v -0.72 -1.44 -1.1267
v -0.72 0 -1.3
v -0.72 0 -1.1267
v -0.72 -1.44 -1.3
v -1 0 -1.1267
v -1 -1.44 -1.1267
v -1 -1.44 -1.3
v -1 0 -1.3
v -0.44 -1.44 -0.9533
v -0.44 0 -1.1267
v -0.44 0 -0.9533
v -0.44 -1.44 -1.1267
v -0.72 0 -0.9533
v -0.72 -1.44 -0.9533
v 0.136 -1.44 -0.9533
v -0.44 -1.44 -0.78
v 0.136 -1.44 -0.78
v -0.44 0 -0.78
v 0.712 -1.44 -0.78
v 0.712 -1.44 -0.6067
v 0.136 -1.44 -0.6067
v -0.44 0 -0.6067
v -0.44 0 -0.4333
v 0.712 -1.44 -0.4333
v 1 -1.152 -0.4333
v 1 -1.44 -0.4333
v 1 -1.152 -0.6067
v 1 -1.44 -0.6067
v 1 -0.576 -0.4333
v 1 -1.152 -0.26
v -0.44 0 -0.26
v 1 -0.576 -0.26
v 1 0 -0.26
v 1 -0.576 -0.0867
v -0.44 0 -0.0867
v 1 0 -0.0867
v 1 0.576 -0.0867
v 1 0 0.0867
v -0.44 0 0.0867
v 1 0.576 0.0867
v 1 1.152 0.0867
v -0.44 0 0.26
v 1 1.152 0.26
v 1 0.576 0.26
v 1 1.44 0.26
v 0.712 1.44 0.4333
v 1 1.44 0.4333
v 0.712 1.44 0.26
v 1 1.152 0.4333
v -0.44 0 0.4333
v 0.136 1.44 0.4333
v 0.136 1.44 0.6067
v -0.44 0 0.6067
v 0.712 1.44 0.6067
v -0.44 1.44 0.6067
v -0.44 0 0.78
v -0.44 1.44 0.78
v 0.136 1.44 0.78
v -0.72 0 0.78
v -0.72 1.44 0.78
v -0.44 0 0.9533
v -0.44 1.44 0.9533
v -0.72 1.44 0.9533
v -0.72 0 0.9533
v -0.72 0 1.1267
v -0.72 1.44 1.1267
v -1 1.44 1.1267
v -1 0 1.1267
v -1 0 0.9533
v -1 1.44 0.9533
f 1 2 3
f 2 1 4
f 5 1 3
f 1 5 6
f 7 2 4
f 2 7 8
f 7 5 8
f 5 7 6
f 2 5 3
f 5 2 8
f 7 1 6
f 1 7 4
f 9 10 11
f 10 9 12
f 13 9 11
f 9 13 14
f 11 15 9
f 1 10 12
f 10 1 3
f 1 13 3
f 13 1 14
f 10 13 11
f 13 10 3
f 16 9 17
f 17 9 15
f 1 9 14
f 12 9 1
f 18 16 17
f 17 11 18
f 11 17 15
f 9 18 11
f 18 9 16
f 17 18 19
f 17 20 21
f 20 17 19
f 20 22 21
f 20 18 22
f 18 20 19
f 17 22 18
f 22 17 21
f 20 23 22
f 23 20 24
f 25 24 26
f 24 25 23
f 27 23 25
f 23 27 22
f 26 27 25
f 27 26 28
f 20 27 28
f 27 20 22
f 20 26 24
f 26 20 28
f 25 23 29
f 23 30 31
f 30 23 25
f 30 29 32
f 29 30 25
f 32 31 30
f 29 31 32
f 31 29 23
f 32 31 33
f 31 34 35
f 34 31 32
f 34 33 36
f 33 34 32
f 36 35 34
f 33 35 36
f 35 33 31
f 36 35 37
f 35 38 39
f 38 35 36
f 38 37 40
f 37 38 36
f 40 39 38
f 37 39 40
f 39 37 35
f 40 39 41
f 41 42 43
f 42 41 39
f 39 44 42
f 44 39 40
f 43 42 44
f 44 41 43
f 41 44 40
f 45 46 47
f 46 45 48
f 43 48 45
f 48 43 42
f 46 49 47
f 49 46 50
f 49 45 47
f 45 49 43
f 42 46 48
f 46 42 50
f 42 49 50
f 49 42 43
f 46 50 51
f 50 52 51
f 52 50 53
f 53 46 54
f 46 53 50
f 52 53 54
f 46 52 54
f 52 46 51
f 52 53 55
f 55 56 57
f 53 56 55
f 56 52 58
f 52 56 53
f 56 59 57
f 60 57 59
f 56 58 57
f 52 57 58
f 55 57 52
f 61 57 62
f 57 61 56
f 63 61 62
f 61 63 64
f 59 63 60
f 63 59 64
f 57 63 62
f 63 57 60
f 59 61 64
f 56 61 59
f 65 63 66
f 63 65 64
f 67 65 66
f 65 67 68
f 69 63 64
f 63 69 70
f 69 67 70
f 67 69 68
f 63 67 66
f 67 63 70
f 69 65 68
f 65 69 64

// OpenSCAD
disponible_x=2.0;
disponible_y=2.88;
disponible_z=2.6;

//de lo sig alternar valores  
//(14 , 1 , 0.9 )
//(13 , 2  , 1.05 )
//(14 , 3 , 1.15)
//(13  , 4 , 1.30)
//(14,  5 , 1.44 ) /

no_escalones=14; //total de niveles en alto
descansos_divs=5; //divisiones en los descansos
ancho_escalones=1.44; //ancho del pasillo del escalon

translate([ - disponible_x/2, - disponible_y/2, - disponible_z/2]){




//ya no variable
espaciox_pescalns=(disponible_x-ancho_escalones)*2;
espacioy_pescalns=disponible_y-(ancho_escalones *2);
total_escalones_ordinarios=no_escalones - (2 * descansos_divs);
huella_pred=(espaciox_pescalns+espacioy_pescalns)/total_escalones_ordinarios;
//echo("preeliminar_huella:",huella_pred);

//cuantos entran en el eje x
cuantos_x=round(espaciox_pescalns/huella_pred);
cuantos_y=round(espacioy_pescalns/huella_pred);
echo("seran en x,y resp. ",cuantos_x,cuantos_y);

tr_x=(espaciox_pescalns/2) / round(cuantos_x/2);
tr_y=espacioy_pescalns / cuantos_y;
tr_z=(disponible_z/(no_escalones+1));
echo("alto de escalon: ",tr_z);
echo("huella en x:",tr_x);
echo("huella en y:",tr_y);
for (i=[0:(round( cuantos_x / 2))-1]){
    tr_x_r=i*tr_x;
    tr_z_r=i*tr_z;
    translate([tr_x_r,0,tr_z_r]){
        
        cube([tr_x,ancho_escalones,tr_z]);  
    }
    
}

glob_tr_x=(round( cuantos_x / 2)) * (espaciox_pescalns/2) / round(cuantos_x/2);
glob_tr_z=(round( cuantos_x / 2)) * (disponible_z/(no_escalones+1));
glob_tr_y=ancho_escalones;

//el o los descansos
if(descansos_divs==1){
    //un cuadrado
    translate([glob_tr_x,0,glob_tr_z]){
        cube([ancho_escalones,ancho_escalones,tr_z]);
    }
    
}else{  
    //REPLICAR ESTO EN EL SIGUIENTE DESCANSO
    huella_ext=(ancho_escalones*2)/descansos_divs;
    for(i=[1:descansos_divs]){
        sig_h=i*huella_ext;
        translate_z=glob_tr_z+(tr_z*(i-1));
        if(sig_h<= ancho_escalones){
            //se sigue en el eje que se venia usando (x)
            nuePosX=(glob_tr_x+(huella_ext*(i-1)));
            translate([0,0,translate_z]){
            linear_extrude(height=tr_z){
                polygon(points=[ [nuePosX,0],[(nuePosX+huella_ext),0],[glob_tr_x,ancho_escalones ] ]);
            }}
        }else{
            //verificar si ya que da en el otro eje totalmente o no
            if( (huella_ext*(i-1)) < ancho_escalones && sig_h> ancho_escalones ){
                nuePosX=(glob_tr_x+(huella_ext*(i-1)));
                nuePosY=  ( huella_ext - ( (glob_tr_x+ancho_escalones) - nuePosX ) ) ; 
                translate([0,0,translate_z]){
                 linear_extrude(height=tr_z){
                        polygon(points=[ [nuePosX,0] ,[(glob_tr_x+ancho_escalones),0], [(glob_tr_x+ancho_escalones), nuePosY ],[glob_tr_x,ancho_escalones ] ]);
                     }}
               
            }else{
                //ya es totalmente del siguiente eje
                nuePosY=  (huella_ext*(i-1)) - ancho_escalones ;
                //echo("...",nuePosY);
                translate([0,0,translate_z]){
            linear_extrude(height=tr_z){
                polygon(points=[ [disponible_x,nuePosY],[disponible_x, (nuePosY + huella_ext)],[glob_tr_x,ancho_escalones ] ]);
            }}
            }
            
        }
    }
}
//x se queda en el mismo lugr
//asignaremos y porque ahora vamos en direccion de y+
if(cuantos_y>0){
for (i=[0: cuantos_y -1]){
    tr_y_r=(i*tr_y) +glob_tr_y;
    tr_z_r=(i*tr_z) +(glob_tr_z+(tr_z*descansos_divs));
    translate([glob_tr_x, tr_y_r, tr_z_r]){
        cube([ancho_escalones,tr_y,tr_z]);  
    }
    
    //glob1=((cuantos_y)*tr_y) +glob_tr_y;
}}else{
    //glob2=disponible_y-ancho_escalones;
}


//volver a definir los globales
glob_tr_y2=disponible_y-ancho_escalones;
glob_tr_z2=(cuantos_y * (disponible_z/(no_escalones+1))) +glob_tr_z+ (tr_z*descansos_divs);
glob_tr_x2=glob_tr_x;

//el o los descansos
if(descansos_divs==1){
    //un cuadrado
    translate([glob_tr_x2,glob_tr_y2,glob_tr_z2]){
        cube([ancho_escalones,ancho_escalones,tr_z]);
    }
    
}else{
    
    huella_ext=(ancho_escalones*2)/descansos_divs;
    for(i=[1:descansos_divs]){
        sig_h=i*huella_ext;
        translate_z=glob_tr_z2+(tr_z*(i-1));
        if(sig_h<= ancho_escalones){
            //se sigue en el eje que se venia usando (y)
            nuePosY=(glob_tr_y2+(huella_ext*(i-1)));
            translate([0,0,translate_z]){
            linear_extrude(height=tr_z){
                polygon(points=[ [disponible_x,nuePosY],[disponible_x,(nuePosY+huella_ext)],[(disponible_x-ancho_escalones) ,glob_tr_y2 ] ]);
            }}
        }else{
            //verificar si ya que da en el otro eje totalmente o no
            if( (huella_ext*(i-1)) < ancho_escalones && sig_h> ancho_escalones ){
                //un eje es en y y el otro enx
                nuePosY=(glob_tr_y2+(huella_ext*(i-1)));
                nuePosX= disponible_x -( huella_ext - ( (glob_tr_y2+ancho_escalones) - nuePosY ) ) ; 
                
                translate([0,0,translate_z]){
                 linear_extrude(height=tr_z){
                        polygon(points=[ [disponible_x,nuePosY] ,[disponible_x,(glob_tr_y2+ancho_escalones)], [nuePosX,(glob_tr_y2+ancho_escalones) ],[disponible_x-ancho_escalones , glob_tr_y2 ] ]);
                     }}
               
            }else{
                //ya es totalmente del siguiente eje
                nuePosX= disponible_x - ( (huella_ext*(i-1)) - ancho_escalones) ;
                //echo("...",nuePosX);
                translate([0,0,translate_z]){
            linear_extrude(height=tr_z){

                polygon(points=[ [nuePosX,disponible_y],[(nuePosX - huella_ext),disponible_y],[(disponible_x-ancho_escalones),glob_tr_y2 ] ]);
            }}
            }
            
        }
    }

}


for (i=[0:(round( cuantos_x / 2))-1]){
    tr_x_r=(glob_tr_x2-tr_x)-(i*tr_x);
    tr_z_r=(i*tr_z) +(glob_tr_z2+(tr_z*descansos_divs));
    translate([tr_x_r, glob_tr_y2 ,tr_z_r]){
        
        cube([tr_x,ancho_escalones,tr_z]);  
    }
    
}
}
